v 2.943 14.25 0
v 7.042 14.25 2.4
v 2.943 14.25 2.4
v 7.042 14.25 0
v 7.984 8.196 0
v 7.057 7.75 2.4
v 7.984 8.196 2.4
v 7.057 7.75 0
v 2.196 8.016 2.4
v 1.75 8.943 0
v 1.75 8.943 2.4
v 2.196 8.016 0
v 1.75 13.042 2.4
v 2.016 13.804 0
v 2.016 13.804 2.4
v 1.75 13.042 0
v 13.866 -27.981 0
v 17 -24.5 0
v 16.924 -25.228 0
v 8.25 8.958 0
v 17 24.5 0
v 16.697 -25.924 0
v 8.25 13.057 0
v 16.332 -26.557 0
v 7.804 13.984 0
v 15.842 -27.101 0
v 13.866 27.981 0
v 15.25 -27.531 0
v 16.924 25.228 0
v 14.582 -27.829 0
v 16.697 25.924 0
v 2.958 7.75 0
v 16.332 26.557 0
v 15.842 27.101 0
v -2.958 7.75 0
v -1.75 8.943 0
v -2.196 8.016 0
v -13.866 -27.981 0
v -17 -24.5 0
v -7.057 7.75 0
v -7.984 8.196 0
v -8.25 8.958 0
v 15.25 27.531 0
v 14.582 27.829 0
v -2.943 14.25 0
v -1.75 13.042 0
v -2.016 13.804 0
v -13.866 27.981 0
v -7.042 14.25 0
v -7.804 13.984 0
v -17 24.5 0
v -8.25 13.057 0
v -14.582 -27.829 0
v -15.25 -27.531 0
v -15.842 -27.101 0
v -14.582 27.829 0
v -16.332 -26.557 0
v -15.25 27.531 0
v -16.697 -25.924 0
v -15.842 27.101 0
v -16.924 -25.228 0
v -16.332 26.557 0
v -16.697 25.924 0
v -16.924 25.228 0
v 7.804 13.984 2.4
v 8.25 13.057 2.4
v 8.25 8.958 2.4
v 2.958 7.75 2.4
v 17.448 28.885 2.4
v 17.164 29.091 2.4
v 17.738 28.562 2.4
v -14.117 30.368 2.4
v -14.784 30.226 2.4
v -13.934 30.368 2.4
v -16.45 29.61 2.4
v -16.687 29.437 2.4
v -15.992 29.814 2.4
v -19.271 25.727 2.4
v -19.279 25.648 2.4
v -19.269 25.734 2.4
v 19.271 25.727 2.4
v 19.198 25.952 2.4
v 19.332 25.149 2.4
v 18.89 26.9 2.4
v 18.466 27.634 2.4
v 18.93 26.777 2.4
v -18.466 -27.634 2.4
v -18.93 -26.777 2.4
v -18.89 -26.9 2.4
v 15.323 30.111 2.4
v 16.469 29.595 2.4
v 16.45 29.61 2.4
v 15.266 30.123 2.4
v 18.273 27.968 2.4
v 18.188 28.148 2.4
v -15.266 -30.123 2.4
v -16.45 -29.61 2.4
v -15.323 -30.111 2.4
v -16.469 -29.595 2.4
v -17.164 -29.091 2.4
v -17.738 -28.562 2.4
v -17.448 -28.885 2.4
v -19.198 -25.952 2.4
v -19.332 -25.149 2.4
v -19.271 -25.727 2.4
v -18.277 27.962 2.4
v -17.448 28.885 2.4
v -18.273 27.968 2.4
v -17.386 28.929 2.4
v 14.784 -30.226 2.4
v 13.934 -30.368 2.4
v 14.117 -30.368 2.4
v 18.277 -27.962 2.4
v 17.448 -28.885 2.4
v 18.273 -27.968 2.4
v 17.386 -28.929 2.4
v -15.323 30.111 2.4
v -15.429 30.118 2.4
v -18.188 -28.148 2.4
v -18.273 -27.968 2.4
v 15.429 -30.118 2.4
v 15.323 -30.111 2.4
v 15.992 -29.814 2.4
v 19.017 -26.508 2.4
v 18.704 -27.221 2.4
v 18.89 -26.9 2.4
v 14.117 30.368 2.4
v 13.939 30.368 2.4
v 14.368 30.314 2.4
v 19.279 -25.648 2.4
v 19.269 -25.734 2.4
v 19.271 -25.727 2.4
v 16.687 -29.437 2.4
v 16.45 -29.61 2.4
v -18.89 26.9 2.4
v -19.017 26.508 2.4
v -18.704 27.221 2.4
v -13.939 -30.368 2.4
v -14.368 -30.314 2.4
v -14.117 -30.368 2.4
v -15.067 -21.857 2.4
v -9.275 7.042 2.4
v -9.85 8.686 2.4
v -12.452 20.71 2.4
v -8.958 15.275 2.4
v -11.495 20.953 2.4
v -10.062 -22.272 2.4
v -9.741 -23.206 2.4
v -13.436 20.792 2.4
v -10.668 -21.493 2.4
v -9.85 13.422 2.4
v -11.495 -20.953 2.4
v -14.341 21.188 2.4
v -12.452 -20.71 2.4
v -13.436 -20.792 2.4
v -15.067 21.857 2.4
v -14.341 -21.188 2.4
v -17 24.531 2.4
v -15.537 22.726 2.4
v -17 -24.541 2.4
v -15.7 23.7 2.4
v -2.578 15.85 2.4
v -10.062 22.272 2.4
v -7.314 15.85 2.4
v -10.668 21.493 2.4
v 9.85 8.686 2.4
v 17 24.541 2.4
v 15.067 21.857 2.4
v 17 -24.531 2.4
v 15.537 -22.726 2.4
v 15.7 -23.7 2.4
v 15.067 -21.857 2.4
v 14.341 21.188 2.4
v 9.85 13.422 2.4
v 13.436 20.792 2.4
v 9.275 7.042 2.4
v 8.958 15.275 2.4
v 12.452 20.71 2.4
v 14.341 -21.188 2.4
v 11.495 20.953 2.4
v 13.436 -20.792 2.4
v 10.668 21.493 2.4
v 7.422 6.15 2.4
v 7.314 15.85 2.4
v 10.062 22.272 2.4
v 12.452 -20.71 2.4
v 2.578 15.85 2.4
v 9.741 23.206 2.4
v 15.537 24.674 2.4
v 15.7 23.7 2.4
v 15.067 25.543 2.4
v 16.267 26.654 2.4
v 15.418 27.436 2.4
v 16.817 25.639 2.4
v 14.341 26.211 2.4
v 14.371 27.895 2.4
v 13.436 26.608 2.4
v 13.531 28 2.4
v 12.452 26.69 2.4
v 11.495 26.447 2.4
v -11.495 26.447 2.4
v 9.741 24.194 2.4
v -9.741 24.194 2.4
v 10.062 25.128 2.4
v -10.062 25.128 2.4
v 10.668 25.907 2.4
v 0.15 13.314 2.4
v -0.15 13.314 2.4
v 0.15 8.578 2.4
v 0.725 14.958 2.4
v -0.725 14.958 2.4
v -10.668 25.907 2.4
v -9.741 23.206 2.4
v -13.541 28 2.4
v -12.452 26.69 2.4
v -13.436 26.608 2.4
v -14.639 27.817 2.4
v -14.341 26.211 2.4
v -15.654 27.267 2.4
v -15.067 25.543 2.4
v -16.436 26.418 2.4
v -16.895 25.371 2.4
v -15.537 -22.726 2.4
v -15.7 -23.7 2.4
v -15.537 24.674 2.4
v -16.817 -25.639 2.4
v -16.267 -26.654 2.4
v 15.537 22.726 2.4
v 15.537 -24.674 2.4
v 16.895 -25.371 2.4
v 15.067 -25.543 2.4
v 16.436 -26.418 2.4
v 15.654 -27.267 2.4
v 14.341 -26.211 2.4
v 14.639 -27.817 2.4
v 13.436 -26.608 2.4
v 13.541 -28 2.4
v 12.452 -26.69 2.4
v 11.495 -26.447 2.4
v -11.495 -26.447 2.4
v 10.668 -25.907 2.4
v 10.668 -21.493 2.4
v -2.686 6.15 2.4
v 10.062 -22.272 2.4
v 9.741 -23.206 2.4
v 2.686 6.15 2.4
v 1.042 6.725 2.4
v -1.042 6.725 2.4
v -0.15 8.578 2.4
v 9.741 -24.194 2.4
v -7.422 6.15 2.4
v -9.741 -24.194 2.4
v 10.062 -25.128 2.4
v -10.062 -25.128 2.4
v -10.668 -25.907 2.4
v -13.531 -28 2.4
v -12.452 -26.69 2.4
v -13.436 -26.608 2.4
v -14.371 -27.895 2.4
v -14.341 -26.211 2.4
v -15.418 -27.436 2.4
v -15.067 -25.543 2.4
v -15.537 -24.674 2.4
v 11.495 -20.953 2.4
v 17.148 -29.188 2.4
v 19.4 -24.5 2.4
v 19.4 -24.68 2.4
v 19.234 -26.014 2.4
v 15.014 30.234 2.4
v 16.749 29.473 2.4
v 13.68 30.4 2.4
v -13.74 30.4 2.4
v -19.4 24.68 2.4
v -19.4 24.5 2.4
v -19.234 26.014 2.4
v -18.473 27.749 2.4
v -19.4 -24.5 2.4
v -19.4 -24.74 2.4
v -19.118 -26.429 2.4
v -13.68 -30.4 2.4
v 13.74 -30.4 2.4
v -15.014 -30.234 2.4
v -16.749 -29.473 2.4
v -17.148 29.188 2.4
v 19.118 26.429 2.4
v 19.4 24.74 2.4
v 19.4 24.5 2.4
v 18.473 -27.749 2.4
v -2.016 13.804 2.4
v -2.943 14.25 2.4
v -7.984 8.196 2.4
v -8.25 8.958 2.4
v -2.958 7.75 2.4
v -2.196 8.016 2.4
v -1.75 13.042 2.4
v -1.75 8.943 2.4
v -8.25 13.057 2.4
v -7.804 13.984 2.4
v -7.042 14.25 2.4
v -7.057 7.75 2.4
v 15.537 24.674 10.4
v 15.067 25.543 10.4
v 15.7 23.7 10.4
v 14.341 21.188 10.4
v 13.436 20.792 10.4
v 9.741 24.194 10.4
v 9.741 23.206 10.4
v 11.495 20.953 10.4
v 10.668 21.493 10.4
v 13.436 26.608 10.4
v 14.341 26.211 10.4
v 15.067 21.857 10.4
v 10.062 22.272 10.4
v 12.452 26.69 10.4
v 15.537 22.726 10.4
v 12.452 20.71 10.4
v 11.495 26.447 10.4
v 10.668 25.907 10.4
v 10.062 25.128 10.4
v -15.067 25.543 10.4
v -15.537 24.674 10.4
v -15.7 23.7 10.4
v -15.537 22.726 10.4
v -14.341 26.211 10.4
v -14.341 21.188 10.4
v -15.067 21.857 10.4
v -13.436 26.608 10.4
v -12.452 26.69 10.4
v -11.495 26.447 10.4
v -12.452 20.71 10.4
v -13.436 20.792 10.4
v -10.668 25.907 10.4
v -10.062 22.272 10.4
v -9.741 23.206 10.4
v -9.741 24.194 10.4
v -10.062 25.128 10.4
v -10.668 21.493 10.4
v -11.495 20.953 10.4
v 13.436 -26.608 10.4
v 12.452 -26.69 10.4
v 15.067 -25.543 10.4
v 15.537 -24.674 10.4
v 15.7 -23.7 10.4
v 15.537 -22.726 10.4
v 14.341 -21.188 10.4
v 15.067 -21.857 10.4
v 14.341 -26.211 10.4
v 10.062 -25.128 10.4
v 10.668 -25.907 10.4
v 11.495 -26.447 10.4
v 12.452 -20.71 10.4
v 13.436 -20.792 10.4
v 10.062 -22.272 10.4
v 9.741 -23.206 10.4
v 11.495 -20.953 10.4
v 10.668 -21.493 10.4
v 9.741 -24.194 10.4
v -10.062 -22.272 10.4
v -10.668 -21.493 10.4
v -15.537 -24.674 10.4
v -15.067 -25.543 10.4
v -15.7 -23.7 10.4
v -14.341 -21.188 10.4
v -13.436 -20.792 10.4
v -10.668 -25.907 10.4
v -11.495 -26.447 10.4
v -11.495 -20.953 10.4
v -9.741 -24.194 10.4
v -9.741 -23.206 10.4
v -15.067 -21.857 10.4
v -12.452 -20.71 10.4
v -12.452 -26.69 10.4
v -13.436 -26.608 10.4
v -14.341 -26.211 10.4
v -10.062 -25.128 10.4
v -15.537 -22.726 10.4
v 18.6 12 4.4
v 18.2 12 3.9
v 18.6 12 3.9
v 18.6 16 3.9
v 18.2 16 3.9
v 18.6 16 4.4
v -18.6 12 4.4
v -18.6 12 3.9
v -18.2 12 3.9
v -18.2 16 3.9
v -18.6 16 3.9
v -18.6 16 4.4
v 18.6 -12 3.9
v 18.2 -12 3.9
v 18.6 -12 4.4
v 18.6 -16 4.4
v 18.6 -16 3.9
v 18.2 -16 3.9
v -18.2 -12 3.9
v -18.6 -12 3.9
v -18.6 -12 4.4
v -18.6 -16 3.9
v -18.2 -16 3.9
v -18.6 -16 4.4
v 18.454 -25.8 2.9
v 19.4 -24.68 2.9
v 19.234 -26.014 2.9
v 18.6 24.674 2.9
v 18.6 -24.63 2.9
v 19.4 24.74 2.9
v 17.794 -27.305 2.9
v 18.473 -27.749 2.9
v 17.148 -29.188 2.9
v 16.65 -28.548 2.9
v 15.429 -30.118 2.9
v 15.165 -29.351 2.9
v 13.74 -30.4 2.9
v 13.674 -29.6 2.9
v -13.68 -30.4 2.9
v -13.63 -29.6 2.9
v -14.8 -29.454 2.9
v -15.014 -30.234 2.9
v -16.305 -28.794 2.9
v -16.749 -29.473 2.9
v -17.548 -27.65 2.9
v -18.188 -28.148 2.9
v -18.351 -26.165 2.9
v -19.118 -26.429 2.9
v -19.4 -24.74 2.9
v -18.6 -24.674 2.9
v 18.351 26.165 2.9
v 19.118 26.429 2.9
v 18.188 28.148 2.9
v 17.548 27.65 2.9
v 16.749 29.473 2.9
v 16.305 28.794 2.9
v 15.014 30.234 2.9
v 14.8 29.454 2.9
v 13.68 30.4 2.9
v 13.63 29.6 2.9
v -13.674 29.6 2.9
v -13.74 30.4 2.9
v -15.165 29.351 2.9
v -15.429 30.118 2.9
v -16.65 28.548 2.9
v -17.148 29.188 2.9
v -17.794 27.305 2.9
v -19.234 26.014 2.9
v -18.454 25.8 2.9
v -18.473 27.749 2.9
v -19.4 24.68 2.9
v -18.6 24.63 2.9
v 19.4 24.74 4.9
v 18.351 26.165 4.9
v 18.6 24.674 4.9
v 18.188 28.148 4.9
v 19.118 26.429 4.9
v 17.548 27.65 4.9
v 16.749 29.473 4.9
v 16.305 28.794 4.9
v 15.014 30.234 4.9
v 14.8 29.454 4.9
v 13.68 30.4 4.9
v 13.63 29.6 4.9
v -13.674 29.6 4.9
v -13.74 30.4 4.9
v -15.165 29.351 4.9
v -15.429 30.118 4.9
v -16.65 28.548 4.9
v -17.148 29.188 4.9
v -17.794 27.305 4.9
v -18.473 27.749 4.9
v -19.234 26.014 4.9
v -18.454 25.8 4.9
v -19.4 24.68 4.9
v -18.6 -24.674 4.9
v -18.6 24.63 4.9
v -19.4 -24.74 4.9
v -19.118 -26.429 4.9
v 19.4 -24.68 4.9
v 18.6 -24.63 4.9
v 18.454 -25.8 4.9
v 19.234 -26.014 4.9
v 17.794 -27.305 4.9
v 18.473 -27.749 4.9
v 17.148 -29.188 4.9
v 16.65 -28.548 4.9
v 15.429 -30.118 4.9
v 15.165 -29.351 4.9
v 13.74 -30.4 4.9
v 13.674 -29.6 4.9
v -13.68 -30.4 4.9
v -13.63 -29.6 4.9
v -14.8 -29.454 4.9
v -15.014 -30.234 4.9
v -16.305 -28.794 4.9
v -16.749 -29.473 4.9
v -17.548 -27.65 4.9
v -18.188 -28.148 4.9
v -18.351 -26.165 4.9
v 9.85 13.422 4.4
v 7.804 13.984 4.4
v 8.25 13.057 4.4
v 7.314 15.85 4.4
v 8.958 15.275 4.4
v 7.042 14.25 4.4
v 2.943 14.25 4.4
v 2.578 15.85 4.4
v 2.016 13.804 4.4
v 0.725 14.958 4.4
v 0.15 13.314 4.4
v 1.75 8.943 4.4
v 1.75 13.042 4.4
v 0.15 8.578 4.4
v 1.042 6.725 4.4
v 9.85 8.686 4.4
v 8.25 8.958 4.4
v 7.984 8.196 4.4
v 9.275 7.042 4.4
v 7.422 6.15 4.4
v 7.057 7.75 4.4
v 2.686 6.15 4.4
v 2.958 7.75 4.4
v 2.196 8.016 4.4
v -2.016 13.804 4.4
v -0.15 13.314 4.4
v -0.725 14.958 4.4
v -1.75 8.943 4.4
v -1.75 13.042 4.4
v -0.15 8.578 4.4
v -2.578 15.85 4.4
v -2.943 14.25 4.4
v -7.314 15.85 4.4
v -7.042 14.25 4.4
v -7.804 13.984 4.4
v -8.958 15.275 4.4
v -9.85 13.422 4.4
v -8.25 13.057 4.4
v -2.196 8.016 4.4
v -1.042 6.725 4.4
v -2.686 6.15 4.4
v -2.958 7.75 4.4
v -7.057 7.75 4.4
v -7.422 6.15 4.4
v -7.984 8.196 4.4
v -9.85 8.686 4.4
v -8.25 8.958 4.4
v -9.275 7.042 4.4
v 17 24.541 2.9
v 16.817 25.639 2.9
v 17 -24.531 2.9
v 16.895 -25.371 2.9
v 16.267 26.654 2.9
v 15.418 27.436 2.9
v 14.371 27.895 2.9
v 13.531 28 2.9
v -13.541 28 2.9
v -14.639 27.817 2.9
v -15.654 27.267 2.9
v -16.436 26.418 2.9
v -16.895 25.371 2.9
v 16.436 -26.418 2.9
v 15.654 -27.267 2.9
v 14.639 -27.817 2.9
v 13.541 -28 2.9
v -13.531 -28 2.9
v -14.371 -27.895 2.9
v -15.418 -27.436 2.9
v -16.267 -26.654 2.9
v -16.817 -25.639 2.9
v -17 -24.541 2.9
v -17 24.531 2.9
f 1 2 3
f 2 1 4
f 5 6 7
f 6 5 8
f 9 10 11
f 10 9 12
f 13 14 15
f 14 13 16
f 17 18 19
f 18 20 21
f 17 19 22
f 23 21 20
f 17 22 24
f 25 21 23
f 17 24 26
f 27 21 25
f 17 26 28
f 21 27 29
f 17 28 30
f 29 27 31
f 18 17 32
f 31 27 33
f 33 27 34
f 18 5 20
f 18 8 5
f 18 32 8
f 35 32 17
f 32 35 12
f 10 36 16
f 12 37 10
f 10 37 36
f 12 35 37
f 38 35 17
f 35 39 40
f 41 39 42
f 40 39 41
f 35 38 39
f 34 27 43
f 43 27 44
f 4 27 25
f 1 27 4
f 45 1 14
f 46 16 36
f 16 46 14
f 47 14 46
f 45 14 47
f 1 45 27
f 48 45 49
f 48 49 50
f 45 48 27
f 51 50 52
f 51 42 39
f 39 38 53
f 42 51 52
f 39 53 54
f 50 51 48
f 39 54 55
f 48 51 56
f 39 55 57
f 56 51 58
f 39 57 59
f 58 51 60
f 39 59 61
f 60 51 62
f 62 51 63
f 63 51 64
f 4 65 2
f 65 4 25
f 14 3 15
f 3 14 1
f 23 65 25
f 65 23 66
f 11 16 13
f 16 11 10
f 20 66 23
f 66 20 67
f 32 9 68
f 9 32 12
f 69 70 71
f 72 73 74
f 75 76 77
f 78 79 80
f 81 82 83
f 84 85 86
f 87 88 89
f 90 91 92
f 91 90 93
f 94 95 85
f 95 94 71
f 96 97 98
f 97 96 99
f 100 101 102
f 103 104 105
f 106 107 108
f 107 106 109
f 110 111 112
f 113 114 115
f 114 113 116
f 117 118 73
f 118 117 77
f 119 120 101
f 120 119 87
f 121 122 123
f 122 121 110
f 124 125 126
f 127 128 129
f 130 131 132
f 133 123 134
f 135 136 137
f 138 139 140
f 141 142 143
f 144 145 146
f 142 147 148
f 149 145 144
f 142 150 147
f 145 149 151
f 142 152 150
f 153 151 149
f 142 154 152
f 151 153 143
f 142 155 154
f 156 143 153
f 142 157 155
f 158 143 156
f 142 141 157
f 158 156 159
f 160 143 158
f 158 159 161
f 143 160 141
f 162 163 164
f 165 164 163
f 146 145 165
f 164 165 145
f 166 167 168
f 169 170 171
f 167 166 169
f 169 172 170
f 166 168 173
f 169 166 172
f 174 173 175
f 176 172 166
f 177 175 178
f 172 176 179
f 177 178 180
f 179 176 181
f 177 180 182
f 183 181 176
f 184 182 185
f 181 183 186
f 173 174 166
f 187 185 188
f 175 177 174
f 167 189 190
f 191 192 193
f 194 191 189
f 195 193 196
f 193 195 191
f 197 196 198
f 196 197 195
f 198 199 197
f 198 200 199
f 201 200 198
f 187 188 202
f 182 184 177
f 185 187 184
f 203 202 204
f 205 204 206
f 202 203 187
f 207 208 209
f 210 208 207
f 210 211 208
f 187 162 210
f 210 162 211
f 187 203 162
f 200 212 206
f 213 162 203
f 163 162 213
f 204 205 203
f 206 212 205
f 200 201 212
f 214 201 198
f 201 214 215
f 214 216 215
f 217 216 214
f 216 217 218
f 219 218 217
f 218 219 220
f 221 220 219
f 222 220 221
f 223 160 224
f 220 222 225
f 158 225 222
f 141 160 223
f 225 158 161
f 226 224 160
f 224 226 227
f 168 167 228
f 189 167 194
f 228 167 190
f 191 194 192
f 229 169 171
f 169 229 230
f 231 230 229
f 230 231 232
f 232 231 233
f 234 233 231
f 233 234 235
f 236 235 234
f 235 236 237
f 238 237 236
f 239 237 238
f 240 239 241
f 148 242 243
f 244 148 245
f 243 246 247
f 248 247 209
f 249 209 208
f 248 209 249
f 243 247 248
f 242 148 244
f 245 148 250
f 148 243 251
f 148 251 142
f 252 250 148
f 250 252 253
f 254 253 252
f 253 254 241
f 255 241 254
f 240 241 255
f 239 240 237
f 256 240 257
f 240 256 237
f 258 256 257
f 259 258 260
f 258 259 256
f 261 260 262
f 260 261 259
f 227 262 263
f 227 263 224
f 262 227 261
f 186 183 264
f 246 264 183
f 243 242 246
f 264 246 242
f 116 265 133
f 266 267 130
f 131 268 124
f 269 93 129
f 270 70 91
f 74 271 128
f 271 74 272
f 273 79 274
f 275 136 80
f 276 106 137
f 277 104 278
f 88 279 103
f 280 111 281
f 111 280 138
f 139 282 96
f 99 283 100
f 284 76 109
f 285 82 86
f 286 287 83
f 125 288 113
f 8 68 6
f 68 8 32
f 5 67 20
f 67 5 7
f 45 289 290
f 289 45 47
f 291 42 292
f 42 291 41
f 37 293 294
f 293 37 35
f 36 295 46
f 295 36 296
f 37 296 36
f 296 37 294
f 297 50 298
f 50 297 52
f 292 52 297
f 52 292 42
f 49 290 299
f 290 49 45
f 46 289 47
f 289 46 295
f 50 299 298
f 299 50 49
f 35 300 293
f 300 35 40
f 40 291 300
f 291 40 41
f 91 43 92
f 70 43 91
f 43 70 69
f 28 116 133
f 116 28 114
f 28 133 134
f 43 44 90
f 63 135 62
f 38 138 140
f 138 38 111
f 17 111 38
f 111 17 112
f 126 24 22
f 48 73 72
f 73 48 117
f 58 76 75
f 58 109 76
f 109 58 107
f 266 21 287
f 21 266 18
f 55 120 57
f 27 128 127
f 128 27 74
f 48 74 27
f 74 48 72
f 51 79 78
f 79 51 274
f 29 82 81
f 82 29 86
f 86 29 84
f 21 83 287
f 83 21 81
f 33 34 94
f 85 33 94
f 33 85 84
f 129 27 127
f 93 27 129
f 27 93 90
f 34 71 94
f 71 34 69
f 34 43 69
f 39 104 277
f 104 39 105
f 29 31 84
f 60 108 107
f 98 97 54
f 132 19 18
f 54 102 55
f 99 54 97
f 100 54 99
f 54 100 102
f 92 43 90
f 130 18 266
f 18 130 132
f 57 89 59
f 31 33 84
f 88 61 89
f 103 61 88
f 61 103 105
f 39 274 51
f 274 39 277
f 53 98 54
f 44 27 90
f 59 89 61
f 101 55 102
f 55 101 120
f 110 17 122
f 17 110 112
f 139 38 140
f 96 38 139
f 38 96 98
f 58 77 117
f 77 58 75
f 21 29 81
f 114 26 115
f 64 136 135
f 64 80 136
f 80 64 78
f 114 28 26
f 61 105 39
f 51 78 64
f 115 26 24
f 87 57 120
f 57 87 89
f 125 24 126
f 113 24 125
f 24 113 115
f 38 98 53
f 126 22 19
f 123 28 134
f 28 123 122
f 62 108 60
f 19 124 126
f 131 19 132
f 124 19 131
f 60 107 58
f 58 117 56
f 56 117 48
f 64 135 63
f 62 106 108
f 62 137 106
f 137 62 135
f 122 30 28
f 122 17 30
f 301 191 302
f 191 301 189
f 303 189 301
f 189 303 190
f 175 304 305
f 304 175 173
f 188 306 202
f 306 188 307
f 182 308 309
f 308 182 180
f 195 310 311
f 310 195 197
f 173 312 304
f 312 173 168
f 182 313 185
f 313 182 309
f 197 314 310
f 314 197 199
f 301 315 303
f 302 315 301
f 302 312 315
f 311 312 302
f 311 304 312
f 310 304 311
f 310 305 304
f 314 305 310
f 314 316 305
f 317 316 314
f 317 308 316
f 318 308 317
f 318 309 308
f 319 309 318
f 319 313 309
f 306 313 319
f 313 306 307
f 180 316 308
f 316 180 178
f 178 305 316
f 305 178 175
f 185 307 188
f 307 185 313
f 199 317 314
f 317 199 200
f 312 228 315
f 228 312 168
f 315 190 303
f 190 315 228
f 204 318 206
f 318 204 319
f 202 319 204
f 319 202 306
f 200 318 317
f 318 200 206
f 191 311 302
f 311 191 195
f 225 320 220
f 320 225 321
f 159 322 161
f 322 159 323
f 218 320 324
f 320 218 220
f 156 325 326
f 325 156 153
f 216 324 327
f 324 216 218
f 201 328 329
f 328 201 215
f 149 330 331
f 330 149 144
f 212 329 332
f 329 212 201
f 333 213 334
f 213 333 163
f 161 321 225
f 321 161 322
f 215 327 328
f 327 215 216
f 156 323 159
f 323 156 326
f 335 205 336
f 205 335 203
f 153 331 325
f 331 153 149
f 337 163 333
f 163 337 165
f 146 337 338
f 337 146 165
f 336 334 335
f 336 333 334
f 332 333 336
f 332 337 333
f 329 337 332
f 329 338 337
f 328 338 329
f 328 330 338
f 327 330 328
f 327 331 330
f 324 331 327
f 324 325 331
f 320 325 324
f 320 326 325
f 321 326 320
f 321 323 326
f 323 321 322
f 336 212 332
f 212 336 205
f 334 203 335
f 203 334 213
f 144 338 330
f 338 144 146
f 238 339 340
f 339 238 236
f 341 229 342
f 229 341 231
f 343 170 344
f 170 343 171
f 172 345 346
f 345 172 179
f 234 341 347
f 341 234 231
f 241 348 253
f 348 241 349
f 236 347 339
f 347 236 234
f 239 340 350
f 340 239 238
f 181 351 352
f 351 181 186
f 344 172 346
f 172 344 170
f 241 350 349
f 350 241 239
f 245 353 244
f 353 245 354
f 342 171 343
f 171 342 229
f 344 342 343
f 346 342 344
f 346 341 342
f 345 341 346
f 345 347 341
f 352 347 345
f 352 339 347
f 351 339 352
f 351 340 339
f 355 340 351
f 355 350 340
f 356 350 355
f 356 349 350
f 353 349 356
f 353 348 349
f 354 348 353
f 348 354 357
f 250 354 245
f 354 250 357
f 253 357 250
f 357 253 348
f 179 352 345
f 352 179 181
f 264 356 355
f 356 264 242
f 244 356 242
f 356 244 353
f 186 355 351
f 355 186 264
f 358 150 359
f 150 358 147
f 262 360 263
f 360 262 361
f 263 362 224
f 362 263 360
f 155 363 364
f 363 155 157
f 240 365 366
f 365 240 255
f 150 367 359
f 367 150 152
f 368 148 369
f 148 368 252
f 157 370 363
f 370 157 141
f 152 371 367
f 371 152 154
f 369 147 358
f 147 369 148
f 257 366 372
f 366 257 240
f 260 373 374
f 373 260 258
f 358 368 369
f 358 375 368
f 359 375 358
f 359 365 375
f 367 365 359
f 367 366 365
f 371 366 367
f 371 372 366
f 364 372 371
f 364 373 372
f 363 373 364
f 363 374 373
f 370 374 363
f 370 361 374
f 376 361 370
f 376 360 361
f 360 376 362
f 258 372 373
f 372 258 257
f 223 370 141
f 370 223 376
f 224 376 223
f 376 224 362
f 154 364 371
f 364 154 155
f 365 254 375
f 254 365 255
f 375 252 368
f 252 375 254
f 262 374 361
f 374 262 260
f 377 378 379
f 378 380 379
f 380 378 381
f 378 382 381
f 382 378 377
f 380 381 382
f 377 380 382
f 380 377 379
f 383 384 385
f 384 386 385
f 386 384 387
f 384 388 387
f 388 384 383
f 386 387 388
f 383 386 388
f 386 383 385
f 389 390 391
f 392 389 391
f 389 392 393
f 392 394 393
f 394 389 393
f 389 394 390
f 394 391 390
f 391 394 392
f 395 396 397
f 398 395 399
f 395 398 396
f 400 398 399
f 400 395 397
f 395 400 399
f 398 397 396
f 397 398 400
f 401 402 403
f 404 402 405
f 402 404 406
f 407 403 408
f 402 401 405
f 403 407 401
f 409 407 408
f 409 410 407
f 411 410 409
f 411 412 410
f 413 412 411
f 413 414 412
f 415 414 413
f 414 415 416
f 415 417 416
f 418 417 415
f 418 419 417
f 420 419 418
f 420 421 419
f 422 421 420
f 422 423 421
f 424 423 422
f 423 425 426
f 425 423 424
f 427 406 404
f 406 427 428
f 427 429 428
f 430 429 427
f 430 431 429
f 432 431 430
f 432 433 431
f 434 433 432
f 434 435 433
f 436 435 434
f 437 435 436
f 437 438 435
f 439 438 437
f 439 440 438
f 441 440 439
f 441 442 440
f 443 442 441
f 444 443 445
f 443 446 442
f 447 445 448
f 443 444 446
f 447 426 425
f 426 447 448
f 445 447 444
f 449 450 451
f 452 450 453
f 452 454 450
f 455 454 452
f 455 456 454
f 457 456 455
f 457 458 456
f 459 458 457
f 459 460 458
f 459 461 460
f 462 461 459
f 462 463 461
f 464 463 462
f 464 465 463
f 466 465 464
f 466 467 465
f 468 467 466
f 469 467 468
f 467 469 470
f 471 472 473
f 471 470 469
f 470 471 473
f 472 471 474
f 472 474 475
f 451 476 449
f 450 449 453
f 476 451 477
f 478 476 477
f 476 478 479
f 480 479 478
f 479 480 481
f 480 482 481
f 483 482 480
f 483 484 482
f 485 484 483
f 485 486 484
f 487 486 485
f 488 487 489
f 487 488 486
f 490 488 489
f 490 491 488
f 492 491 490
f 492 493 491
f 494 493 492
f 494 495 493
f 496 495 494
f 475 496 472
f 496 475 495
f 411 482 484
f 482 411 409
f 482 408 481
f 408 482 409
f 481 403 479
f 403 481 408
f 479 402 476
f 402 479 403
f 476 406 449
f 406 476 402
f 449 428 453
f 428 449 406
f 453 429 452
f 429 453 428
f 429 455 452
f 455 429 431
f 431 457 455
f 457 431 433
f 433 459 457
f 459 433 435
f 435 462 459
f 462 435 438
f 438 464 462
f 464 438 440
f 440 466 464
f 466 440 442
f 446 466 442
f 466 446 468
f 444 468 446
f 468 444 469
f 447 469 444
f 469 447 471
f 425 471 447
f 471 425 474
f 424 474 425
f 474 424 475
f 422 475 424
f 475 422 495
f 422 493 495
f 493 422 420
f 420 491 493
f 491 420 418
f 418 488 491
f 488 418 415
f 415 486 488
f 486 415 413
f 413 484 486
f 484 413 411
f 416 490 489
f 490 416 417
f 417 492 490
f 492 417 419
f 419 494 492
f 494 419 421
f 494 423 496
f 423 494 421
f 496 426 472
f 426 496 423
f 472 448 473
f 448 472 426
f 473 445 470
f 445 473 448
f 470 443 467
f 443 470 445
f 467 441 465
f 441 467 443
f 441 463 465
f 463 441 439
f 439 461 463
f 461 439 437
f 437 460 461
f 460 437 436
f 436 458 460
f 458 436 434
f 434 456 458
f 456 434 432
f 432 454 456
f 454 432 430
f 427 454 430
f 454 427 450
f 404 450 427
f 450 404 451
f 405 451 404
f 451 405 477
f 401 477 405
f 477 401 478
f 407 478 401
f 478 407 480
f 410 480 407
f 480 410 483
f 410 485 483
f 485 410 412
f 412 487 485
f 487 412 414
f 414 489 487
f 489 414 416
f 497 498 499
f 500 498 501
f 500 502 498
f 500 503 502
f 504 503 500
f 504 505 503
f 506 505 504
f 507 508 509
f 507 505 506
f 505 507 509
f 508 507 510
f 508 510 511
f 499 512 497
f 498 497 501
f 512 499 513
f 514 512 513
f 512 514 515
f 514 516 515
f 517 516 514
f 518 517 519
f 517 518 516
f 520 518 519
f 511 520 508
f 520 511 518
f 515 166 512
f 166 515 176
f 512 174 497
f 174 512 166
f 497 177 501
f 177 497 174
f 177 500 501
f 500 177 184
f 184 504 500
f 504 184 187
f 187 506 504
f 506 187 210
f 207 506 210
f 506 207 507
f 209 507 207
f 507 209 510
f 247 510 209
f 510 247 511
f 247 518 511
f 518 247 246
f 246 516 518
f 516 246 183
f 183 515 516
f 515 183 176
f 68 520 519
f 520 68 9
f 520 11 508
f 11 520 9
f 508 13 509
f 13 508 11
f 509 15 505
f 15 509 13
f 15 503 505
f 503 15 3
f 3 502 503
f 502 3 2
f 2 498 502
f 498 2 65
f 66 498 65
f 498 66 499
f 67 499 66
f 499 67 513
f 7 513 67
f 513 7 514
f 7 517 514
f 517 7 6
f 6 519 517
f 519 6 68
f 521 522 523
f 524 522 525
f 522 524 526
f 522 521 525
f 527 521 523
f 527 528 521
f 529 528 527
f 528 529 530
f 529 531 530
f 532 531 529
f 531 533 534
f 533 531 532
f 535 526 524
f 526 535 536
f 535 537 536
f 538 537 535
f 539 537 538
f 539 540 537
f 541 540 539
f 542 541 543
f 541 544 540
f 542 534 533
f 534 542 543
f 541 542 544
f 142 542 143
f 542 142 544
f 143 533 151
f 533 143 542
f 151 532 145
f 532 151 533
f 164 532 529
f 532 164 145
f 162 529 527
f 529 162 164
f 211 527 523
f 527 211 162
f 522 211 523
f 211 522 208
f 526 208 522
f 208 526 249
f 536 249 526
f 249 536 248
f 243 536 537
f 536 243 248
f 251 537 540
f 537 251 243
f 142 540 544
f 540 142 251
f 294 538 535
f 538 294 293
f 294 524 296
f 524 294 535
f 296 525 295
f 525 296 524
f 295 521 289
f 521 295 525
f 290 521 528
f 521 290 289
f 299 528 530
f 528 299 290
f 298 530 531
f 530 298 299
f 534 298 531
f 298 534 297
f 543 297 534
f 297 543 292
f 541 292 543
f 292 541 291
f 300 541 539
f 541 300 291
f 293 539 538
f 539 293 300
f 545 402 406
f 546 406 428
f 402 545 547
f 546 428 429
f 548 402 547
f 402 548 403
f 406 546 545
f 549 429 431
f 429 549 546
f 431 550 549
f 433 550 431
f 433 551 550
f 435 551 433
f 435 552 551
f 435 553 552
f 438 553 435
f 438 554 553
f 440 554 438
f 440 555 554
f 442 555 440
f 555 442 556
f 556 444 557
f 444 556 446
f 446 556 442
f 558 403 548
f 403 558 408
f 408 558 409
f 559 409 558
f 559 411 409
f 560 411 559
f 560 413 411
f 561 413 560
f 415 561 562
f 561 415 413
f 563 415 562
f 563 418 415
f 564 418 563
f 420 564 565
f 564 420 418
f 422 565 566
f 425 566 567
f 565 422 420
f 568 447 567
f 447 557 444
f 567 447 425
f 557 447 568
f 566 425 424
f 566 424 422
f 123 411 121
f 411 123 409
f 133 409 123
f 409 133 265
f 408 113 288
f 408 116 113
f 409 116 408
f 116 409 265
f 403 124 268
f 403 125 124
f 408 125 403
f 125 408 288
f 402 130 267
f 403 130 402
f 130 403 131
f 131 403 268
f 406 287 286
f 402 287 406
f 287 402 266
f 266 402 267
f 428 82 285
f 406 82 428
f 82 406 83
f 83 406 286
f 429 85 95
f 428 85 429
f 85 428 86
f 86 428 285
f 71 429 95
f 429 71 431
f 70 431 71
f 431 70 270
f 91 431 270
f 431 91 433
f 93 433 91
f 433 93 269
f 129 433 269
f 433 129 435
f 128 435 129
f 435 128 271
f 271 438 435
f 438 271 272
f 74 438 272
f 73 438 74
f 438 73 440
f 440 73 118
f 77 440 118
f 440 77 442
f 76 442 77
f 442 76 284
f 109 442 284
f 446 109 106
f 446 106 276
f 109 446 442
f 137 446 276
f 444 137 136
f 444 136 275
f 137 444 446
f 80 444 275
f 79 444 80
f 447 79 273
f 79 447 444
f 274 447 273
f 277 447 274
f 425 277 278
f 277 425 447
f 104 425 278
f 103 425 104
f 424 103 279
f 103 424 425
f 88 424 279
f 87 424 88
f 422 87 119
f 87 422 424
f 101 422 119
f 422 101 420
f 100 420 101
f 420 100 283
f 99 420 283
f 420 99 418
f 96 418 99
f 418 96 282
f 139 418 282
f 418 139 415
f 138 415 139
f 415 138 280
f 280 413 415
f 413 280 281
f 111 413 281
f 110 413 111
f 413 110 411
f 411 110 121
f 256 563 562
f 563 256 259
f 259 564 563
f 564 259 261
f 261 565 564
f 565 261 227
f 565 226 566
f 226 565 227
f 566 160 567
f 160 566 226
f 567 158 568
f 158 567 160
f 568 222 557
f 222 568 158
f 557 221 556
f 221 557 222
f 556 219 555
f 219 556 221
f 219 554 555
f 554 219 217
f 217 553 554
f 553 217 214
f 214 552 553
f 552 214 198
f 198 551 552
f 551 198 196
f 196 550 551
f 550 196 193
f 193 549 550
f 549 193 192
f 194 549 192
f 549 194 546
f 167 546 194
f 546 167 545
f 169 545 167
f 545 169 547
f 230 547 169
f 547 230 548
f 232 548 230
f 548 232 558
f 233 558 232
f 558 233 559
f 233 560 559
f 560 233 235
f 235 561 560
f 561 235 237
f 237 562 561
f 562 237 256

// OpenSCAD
// file: parameters.scad
WallClearance = 0.5;
WallThickness = 2.4;

pcbw = 33;
pcbl = 55;
pcbt = 1;

PCBHoleR = 1.6;
PCBHoleEdgeDst = 2.2;

BottomHeaderHeight=8.6;
TopHeaderHeight=7.5; // TODO actually measured to 7.70

TightFit = 0.15;
LooseFit = 0.25;

flangeHeight = 2;
flangeW = 1.2;
outerFlangeW = 0.8;

snapH = 0.5;
snapD = 0.4;

buttonW = 6; // TODO merge?
PCBButtonW = 6;
PCBButtonH = 5;

buttonFlange = 1; // W & H
buttonR = 1;

epsilon = 0.001;

$fs=1;

module pcb() {
	rrect4(pcbw, pcbl, 3);
}
// file: se/antoneliasson/shapes.scad
/*
 * A library of (at the moment) 2D shapes.
 *
 * Copyright (c) 2017 Anton Eliasson
 *
 * MIT License
 */

/*
 * Rounded rectangle (1 corner)
 *
 * Right angle in origin, rounded corner furthest from origin.
 */
module rrect1(x, y, r) {
	assert(x >= 2*r && y >= 2*r);

	hull () {
		polygon([[0, 0], [x, 0], [0, y]]);
		translate([x-r, y-r, 0]) circle(r=r);
	}
}

/*
 * Rounded square (1 corner)
 *
 * Like rrect1 but equilateral.
 */
module rsquare1(s, r) {
	rrect1(s, s, r);
}

/*
 * Rounded rectangle (all 4 corners)
 */
module rrect4(x, y, r) {
	offset(r=r) offset(delta=-r) square([x, y], true);
}

/*
 * Rounded square (all 4 corners)
 *
 * Like rrect4 but equilateral.
 */
module rsquare4(s, r) {
	rrect4(s, s, r);
}

/*
 * Triangle with right angle in origin.
 */
module triangle(x, y) {
	polygon([[0, 0], [x, 0], [0, y]]);
}

module trapezoid(a, b, h, skew) {
	polygon([[0, 0], [a, 0], [skew+b, h], [skew, h]]);
}
// file: se/antoneliasson/operations.scad
/*
 * A library of transformations and operations on objects.
 *
 * Copyright (c) 2017 Anton Eliasson
 *
 * MIT License
 */

/*
 * Alias for linear_extrude, without the need to name the height parameter.
 */
module linextr(h) {
	linear_extrude(height=h) children();
}

/*
 * Mirror children through the XZ plane, the YZ plane, and both, resulting in
 * four copies around the origin.
 */
module fourwaymirror() {
	children();
	mirror([1, 0, 0]) children();
	mirror([0, 1, 0]) children();
	mirror([1, 0, 0]) mirror([0, 1, 0]) children();
}

module mirrorXZ() {
    children();
    mirror([0, 1, 0]) children();
}

module mirrorYZ() {
	children();
	mirror([1, 0, 0]) children();
}

// TODO fourwaymirror = mirrorXZ mirrorYZ
// main file
use <se/antoneliasson/operations.scad>
use <se/antoneliasson/shapes.scad>

include <parameters.scad>

module standoff() {
	translate([pcbw/2-PCBHoleEdgeDst-PCBHoleR, pcbl/2-PCBHoleEdgeDst-PCBHoleR, 0])
		linear_extrude(height=TopHeaderHeight+WallClearance) circle(r=3);
}

module snap() {
	translate([pcbw/2+WallClearance+WallThickness-outerFlangeW, 16-4, -2*snapH])
		rotate([90, 0, 180]) linear_extrude(height=4) triangle(snapD, snapH);
}

module buttonGuide() {
	linextr(WallClearance+TopHeaderHeight-(buttonFlange+PCBButtonH))
		difference() {
			offset(delta=LooseFit+1.6) rsquare4(buttonW, buttonR);
			offset(delta=LooseFit) rsquare4(buttonW, buttonR);
		}
}

module Top() {
	// floor (roof when flipped)
	difference() {
		hull() fourwaymirror() translate([pcbw/2-3, pcbl/2-3, 0])
		cylinder(h=WallThickness, r1=3+WallClearance+WallThickness-WallThickness, r2=3+WallClearance+WallThickness);
		mirrorYZ() translate([2+PCBButtonW/2, 8+PCBButtonW/2, 0])
			linear_extrude(height=WallThickness)
				offset(delta=LooseFit) rsquare4(buttonW, buttonR);
	}
	fourwaymirror() translate([0, 0, WallThickness]) standoff();

	// walls
	translate([0, 0, WallThickness]) linear_extrude(height=WallClearance)
		difference() {
			offset(delta=WallClearance+WallThickness) pcb();
			offset(delta=WallClearance) pcb();
		}

	// flange
	translate([0, 0, WallThickness+WallClearance]) {
		linear_extrude(height=flangeHeight)
			difference() {
				offset(delta=WallClearance+WallThickness) pcb();
				offset(delta=WallClearance+WallThickness-outerFlangeW) pcb();
			}
		// snaps
		fourwaymirror() {
			translate([0, 0, flangeHeight]) snap();
		}
	}

	mirrorYZ() translate([2+PCBButtonW/2, 8+PCBButtonW/2, WallThickness])
		buttonGuide();

}

render() Top();
